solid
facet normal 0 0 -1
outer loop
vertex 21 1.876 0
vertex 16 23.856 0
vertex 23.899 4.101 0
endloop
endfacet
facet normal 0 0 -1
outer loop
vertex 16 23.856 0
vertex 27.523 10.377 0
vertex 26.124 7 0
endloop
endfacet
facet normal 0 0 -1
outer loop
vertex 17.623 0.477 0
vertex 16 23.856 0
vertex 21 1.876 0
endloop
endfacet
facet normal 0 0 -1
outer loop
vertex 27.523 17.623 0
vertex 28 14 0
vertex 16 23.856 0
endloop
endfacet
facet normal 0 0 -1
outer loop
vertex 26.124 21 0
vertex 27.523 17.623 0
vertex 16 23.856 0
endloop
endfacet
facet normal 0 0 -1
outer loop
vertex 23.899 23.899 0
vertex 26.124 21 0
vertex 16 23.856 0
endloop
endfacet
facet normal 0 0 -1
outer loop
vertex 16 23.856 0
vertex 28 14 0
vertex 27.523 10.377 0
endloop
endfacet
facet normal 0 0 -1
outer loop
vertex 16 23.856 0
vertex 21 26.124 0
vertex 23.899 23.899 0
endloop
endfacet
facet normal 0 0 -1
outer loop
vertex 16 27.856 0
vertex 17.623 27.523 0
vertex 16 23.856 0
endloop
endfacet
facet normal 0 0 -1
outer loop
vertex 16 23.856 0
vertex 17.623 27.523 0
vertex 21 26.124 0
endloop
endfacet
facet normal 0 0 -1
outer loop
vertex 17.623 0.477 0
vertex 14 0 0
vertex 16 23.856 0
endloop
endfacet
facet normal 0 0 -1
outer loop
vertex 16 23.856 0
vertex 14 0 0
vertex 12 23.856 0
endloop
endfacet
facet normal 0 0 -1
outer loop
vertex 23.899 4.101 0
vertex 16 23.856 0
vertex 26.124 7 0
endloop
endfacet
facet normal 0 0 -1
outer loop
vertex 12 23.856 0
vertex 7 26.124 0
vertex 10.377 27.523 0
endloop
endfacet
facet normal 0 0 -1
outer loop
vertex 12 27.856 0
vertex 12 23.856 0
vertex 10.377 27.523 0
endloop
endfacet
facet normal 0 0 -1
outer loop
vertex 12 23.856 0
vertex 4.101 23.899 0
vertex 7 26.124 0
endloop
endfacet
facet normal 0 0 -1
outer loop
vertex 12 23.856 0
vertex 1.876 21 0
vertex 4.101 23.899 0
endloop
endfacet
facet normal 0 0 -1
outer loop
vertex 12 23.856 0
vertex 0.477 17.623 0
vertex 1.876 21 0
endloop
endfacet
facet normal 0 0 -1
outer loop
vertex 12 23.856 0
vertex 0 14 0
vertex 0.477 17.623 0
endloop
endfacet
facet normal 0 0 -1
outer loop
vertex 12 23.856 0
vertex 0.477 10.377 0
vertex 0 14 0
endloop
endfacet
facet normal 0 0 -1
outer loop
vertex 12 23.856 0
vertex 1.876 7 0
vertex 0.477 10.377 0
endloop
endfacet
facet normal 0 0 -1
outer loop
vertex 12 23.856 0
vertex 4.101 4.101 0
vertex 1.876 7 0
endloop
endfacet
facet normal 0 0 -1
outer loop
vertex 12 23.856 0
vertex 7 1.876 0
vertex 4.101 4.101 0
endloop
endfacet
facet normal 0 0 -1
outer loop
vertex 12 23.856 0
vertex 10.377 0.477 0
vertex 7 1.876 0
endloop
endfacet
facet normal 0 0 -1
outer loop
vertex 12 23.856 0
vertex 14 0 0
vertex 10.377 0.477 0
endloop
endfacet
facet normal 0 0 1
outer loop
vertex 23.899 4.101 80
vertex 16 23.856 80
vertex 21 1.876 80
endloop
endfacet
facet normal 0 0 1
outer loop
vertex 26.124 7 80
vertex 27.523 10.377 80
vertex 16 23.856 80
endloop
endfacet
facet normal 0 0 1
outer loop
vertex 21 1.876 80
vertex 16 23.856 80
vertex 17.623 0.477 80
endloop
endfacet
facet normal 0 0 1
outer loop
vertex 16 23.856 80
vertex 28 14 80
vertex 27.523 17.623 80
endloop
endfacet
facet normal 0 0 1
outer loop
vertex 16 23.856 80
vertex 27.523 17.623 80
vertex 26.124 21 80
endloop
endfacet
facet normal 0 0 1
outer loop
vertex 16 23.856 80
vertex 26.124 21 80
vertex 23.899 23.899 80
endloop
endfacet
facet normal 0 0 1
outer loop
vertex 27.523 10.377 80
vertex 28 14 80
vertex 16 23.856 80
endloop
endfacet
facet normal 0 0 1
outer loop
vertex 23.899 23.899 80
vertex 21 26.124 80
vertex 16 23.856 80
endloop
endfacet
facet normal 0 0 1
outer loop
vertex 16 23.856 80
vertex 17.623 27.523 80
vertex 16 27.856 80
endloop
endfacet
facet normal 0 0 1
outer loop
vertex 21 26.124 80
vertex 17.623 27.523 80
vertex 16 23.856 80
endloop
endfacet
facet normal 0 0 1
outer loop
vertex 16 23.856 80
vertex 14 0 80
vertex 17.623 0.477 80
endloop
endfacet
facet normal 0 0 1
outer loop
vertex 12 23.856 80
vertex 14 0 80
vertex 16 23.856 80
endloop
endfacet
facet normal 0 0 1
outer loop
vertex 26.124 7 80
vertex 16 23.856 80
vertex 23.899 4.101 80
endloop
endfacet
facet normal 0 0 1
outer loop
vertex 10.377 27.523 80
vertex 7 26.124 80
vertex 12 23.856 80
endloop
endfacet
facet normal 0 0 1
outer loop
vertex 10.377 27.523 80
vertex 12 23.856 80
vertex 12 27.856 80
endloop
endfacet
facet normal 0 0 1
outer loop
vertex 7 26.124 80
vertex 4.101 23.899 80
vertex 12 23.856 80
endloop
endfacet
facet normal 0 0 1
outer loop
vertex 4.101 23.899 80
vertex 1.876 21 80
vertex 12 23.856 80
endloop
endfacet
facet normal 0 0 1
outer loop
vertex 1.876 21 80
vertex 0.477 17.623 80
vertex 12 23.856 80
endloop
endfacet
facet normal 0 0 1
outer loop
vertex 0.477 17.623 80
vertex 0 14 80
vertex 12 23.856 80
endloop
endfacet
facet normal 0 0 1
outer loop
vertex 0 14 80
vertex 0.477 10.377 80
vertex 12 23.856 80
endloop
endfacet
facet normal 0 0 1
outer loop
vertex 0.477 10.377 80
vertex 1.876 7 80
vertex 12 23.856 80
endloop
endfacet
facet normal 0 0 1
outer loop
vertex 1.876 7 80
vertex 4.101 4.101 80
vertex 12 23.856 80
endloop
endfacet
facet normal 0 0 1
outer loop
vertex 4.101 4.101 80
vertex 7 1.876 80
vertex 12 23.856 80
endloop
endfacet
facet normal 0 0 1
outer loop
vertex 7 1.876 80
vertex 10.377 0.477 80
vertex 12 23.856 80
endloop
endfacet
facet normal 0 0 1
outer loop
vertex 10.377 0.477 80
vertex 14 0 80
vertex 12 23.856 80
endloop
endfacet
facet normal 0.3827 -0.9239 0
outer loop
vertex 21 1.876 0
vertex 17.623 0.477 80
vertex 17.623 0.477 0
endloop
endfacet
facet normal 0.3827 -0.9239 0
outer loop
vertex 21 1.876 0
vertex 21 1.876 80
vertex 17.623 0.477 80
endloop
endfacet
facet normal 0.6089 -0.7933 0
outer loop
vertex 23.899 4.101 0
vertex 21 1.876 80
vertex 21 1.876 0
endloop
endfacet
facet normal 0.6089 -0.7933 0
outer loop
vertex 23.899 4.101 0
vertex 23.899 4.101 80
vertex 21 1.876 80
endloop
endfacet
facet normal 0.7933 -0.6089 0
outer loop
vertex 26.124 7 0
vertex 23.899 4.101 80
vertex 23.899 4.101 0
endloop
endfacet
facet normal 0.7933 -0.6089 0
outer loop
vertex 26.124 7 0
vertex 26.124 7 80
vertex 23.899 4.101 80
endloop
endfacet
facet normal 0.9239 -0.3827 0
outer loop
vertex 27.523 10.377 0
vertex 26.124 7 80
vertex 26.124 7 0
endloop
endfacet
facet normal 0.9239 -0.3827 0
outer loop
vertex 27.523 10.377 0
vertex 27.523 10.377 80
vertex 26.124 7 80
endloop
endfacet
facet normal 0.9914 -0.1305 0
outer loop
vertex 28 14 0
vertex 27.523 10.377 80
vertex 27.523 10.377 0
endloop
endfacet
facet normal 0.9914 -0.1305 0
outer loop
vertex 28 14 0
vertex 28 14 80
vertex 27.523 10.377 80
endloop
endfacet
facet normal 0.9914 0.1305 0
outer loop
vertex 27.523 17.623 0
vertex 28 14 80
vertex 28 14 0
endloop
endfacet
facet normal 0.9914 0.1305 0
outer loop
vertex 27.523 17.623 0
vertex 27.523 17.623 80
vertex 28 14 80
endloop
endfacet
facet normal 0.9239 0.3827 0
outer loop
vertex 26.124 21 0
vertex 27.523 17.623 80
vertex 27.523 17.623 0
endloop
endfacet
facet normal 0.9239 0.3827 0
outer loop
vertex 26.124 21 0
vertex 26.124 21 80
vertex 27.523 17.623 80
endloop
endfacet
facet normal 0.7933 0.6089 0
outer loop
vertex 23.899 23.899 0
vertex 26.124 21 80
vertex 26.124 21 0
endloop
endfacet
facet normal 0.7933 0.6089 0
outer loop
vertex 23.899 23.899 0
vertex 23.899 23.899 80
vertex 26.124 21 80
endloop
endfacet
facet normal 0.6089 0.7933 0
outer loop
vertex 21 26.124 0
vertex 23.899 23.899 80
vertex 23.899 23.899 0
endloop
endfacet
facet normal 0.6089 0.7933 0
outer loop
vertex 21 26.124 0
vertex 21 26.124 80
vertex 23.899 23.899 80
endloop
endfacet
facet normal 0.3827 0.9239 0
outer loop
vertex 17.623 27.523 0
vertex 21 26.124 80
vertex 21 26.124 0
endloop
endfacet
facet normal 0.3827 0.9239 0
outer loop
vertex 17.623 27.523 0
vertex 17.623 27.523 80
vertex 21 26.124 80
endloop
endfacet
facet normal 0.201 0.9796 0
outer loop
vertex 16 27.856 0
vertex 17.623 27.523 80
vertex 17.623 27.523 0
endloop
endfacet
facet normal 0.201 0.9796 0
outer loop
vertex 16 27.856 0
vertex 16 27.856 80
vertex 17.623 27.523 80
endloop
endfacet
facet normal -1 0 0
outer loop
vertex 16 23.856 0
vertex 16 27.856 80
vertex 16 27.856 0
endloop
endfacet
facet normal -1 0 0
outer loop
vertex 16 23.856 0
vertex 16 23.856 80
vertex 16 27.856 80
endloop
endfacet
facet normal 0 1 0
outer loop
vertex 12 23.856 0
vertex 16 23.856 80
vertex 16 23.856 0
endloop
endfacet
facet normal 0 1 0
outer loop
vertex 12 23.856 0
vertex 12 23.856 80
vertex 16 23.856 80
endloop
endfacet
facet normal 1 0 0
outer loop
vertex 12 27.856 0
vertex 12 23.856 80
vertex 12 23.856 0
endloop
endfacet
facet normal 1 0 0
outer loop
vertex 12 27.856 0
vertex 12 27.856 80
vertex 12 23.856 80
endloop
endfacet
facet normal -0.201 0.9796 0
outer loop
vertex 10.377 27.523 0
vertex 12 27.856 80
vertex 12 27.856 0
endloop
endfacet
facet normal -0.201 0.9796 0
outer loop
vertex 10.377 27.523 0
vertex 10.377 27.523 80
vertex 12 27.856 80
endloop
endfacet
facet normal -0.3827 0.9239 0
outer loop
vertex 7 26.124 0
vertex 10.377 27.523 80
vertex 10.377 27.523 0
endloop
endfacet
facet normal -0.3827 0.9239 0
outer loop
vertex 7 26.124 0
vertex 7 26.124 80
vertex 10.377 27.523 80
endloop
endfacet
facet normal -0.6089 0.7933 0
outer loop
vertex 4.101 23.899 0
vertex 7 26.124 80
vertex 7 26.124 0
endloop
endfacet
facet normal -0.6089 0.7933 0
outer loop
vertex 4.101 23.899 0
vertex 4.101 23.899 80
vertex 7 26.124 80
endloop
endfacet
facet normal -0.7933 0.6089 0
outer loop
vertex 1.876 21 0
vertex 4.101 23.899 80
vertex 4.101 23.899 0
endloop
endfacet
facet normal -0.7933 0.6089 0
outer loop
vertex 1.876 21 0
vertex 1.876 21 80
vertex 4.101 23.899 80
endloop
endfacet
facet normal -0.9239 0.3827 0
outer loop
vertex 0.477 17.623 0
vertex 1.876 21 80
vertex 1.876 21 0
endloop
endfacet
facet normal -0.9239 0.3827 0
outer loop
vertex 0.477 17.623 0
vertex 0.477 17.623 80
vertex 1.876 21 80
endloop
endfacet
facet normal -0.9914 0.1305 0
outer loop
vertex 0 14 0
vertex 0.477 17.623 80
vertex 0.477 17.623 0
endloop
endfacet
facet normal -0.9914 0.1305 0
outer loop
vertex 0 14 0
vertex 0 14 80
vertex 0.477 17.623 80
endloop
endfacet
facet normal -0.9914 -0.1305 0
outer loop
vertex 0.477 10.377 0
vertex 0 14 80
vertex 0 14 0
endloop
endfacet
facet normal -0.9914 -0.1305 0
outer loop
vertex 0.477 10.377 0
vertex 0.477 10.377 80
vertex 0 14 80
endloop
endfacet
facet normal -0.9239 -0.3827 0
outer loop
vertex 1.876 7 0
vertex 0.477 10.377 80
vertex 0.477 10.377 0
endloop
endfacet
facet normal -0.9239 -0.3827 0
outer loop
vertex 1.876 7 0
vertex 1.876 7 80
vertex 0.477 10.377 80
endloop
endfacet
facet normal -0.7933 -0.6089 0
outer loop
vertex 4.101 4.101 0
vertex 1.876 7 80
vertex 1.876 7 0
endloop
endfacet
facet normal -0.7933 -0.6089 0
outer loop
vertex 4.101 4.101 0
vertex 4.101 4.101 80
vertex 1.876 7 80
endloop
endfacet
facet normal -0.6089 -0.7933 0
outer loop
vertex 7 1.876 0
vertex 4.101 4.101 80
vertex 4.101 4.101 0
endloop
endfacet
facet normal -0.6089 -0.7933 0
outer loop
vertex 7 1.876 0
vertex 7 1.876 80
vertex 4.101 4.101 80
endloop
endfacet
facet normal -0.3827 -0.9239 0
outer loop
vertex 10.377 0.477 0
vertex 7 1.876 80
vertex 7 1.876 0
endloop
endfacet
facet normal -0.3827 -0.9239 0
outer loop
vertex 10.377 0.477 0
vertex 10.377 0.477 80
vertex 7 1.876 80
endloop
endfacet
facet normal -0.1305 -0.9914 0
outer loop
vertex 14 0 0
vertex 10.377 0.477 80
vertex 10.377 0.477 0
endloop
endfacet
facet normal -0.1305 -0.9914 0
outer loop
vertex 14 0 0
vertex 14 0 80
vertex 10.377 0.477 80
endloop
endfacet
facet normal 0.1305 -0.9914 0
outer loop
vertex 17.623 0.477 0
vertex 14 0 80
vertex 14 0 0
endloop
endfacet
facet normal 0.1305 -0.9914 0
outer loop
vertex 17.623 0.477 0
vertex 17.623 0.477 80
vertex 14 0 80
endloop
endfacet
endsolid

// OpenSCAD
$fn = 32;

// ----------------------------------------------------------------------
// Keyway shaft: d28 shaft, key 4 x 4 mm
// ----------------------------------------------------------------------

// --- parameters (mm) ---
shaft_r = 14;             // shaft radius
key_w = 4;                // keyway width
key_d = 4;                // keyway depth below the surface line
plate_t = 80;             // shaft length, Z (extrusion height)

shaft_d = 2 * shaft_r;  // shaft diameter
circle_step = 15;  // polygon sampling step, degrees

profile = [[10.377, 27.523], [7, 26.124], [4.101, 23.899], [1.876, 21], [0.477, 17.623], [0, 14], [0.477, 10.377], [1.876, 7], [4.101, 4.101], [7, 1.876], [10.377, 0.477], [14, 0], [17.623, 0.477], [21, 1.876], [23.899, 4.101], [26.124, 7], [27.523, 10.377], [28, 14], [27.523, 17.623], [26.124, 21], [23.899, 23.899], [21, 26.124], [17.623, 27.523], [16, 27.856], [16, 23.856], [12, 23.856], [12, 27.856]];  // primary outline, 27 points, counter clockwise

// --- the one profile operation ---
linear_extrude(height = plate_t) polygon(points = profile);
